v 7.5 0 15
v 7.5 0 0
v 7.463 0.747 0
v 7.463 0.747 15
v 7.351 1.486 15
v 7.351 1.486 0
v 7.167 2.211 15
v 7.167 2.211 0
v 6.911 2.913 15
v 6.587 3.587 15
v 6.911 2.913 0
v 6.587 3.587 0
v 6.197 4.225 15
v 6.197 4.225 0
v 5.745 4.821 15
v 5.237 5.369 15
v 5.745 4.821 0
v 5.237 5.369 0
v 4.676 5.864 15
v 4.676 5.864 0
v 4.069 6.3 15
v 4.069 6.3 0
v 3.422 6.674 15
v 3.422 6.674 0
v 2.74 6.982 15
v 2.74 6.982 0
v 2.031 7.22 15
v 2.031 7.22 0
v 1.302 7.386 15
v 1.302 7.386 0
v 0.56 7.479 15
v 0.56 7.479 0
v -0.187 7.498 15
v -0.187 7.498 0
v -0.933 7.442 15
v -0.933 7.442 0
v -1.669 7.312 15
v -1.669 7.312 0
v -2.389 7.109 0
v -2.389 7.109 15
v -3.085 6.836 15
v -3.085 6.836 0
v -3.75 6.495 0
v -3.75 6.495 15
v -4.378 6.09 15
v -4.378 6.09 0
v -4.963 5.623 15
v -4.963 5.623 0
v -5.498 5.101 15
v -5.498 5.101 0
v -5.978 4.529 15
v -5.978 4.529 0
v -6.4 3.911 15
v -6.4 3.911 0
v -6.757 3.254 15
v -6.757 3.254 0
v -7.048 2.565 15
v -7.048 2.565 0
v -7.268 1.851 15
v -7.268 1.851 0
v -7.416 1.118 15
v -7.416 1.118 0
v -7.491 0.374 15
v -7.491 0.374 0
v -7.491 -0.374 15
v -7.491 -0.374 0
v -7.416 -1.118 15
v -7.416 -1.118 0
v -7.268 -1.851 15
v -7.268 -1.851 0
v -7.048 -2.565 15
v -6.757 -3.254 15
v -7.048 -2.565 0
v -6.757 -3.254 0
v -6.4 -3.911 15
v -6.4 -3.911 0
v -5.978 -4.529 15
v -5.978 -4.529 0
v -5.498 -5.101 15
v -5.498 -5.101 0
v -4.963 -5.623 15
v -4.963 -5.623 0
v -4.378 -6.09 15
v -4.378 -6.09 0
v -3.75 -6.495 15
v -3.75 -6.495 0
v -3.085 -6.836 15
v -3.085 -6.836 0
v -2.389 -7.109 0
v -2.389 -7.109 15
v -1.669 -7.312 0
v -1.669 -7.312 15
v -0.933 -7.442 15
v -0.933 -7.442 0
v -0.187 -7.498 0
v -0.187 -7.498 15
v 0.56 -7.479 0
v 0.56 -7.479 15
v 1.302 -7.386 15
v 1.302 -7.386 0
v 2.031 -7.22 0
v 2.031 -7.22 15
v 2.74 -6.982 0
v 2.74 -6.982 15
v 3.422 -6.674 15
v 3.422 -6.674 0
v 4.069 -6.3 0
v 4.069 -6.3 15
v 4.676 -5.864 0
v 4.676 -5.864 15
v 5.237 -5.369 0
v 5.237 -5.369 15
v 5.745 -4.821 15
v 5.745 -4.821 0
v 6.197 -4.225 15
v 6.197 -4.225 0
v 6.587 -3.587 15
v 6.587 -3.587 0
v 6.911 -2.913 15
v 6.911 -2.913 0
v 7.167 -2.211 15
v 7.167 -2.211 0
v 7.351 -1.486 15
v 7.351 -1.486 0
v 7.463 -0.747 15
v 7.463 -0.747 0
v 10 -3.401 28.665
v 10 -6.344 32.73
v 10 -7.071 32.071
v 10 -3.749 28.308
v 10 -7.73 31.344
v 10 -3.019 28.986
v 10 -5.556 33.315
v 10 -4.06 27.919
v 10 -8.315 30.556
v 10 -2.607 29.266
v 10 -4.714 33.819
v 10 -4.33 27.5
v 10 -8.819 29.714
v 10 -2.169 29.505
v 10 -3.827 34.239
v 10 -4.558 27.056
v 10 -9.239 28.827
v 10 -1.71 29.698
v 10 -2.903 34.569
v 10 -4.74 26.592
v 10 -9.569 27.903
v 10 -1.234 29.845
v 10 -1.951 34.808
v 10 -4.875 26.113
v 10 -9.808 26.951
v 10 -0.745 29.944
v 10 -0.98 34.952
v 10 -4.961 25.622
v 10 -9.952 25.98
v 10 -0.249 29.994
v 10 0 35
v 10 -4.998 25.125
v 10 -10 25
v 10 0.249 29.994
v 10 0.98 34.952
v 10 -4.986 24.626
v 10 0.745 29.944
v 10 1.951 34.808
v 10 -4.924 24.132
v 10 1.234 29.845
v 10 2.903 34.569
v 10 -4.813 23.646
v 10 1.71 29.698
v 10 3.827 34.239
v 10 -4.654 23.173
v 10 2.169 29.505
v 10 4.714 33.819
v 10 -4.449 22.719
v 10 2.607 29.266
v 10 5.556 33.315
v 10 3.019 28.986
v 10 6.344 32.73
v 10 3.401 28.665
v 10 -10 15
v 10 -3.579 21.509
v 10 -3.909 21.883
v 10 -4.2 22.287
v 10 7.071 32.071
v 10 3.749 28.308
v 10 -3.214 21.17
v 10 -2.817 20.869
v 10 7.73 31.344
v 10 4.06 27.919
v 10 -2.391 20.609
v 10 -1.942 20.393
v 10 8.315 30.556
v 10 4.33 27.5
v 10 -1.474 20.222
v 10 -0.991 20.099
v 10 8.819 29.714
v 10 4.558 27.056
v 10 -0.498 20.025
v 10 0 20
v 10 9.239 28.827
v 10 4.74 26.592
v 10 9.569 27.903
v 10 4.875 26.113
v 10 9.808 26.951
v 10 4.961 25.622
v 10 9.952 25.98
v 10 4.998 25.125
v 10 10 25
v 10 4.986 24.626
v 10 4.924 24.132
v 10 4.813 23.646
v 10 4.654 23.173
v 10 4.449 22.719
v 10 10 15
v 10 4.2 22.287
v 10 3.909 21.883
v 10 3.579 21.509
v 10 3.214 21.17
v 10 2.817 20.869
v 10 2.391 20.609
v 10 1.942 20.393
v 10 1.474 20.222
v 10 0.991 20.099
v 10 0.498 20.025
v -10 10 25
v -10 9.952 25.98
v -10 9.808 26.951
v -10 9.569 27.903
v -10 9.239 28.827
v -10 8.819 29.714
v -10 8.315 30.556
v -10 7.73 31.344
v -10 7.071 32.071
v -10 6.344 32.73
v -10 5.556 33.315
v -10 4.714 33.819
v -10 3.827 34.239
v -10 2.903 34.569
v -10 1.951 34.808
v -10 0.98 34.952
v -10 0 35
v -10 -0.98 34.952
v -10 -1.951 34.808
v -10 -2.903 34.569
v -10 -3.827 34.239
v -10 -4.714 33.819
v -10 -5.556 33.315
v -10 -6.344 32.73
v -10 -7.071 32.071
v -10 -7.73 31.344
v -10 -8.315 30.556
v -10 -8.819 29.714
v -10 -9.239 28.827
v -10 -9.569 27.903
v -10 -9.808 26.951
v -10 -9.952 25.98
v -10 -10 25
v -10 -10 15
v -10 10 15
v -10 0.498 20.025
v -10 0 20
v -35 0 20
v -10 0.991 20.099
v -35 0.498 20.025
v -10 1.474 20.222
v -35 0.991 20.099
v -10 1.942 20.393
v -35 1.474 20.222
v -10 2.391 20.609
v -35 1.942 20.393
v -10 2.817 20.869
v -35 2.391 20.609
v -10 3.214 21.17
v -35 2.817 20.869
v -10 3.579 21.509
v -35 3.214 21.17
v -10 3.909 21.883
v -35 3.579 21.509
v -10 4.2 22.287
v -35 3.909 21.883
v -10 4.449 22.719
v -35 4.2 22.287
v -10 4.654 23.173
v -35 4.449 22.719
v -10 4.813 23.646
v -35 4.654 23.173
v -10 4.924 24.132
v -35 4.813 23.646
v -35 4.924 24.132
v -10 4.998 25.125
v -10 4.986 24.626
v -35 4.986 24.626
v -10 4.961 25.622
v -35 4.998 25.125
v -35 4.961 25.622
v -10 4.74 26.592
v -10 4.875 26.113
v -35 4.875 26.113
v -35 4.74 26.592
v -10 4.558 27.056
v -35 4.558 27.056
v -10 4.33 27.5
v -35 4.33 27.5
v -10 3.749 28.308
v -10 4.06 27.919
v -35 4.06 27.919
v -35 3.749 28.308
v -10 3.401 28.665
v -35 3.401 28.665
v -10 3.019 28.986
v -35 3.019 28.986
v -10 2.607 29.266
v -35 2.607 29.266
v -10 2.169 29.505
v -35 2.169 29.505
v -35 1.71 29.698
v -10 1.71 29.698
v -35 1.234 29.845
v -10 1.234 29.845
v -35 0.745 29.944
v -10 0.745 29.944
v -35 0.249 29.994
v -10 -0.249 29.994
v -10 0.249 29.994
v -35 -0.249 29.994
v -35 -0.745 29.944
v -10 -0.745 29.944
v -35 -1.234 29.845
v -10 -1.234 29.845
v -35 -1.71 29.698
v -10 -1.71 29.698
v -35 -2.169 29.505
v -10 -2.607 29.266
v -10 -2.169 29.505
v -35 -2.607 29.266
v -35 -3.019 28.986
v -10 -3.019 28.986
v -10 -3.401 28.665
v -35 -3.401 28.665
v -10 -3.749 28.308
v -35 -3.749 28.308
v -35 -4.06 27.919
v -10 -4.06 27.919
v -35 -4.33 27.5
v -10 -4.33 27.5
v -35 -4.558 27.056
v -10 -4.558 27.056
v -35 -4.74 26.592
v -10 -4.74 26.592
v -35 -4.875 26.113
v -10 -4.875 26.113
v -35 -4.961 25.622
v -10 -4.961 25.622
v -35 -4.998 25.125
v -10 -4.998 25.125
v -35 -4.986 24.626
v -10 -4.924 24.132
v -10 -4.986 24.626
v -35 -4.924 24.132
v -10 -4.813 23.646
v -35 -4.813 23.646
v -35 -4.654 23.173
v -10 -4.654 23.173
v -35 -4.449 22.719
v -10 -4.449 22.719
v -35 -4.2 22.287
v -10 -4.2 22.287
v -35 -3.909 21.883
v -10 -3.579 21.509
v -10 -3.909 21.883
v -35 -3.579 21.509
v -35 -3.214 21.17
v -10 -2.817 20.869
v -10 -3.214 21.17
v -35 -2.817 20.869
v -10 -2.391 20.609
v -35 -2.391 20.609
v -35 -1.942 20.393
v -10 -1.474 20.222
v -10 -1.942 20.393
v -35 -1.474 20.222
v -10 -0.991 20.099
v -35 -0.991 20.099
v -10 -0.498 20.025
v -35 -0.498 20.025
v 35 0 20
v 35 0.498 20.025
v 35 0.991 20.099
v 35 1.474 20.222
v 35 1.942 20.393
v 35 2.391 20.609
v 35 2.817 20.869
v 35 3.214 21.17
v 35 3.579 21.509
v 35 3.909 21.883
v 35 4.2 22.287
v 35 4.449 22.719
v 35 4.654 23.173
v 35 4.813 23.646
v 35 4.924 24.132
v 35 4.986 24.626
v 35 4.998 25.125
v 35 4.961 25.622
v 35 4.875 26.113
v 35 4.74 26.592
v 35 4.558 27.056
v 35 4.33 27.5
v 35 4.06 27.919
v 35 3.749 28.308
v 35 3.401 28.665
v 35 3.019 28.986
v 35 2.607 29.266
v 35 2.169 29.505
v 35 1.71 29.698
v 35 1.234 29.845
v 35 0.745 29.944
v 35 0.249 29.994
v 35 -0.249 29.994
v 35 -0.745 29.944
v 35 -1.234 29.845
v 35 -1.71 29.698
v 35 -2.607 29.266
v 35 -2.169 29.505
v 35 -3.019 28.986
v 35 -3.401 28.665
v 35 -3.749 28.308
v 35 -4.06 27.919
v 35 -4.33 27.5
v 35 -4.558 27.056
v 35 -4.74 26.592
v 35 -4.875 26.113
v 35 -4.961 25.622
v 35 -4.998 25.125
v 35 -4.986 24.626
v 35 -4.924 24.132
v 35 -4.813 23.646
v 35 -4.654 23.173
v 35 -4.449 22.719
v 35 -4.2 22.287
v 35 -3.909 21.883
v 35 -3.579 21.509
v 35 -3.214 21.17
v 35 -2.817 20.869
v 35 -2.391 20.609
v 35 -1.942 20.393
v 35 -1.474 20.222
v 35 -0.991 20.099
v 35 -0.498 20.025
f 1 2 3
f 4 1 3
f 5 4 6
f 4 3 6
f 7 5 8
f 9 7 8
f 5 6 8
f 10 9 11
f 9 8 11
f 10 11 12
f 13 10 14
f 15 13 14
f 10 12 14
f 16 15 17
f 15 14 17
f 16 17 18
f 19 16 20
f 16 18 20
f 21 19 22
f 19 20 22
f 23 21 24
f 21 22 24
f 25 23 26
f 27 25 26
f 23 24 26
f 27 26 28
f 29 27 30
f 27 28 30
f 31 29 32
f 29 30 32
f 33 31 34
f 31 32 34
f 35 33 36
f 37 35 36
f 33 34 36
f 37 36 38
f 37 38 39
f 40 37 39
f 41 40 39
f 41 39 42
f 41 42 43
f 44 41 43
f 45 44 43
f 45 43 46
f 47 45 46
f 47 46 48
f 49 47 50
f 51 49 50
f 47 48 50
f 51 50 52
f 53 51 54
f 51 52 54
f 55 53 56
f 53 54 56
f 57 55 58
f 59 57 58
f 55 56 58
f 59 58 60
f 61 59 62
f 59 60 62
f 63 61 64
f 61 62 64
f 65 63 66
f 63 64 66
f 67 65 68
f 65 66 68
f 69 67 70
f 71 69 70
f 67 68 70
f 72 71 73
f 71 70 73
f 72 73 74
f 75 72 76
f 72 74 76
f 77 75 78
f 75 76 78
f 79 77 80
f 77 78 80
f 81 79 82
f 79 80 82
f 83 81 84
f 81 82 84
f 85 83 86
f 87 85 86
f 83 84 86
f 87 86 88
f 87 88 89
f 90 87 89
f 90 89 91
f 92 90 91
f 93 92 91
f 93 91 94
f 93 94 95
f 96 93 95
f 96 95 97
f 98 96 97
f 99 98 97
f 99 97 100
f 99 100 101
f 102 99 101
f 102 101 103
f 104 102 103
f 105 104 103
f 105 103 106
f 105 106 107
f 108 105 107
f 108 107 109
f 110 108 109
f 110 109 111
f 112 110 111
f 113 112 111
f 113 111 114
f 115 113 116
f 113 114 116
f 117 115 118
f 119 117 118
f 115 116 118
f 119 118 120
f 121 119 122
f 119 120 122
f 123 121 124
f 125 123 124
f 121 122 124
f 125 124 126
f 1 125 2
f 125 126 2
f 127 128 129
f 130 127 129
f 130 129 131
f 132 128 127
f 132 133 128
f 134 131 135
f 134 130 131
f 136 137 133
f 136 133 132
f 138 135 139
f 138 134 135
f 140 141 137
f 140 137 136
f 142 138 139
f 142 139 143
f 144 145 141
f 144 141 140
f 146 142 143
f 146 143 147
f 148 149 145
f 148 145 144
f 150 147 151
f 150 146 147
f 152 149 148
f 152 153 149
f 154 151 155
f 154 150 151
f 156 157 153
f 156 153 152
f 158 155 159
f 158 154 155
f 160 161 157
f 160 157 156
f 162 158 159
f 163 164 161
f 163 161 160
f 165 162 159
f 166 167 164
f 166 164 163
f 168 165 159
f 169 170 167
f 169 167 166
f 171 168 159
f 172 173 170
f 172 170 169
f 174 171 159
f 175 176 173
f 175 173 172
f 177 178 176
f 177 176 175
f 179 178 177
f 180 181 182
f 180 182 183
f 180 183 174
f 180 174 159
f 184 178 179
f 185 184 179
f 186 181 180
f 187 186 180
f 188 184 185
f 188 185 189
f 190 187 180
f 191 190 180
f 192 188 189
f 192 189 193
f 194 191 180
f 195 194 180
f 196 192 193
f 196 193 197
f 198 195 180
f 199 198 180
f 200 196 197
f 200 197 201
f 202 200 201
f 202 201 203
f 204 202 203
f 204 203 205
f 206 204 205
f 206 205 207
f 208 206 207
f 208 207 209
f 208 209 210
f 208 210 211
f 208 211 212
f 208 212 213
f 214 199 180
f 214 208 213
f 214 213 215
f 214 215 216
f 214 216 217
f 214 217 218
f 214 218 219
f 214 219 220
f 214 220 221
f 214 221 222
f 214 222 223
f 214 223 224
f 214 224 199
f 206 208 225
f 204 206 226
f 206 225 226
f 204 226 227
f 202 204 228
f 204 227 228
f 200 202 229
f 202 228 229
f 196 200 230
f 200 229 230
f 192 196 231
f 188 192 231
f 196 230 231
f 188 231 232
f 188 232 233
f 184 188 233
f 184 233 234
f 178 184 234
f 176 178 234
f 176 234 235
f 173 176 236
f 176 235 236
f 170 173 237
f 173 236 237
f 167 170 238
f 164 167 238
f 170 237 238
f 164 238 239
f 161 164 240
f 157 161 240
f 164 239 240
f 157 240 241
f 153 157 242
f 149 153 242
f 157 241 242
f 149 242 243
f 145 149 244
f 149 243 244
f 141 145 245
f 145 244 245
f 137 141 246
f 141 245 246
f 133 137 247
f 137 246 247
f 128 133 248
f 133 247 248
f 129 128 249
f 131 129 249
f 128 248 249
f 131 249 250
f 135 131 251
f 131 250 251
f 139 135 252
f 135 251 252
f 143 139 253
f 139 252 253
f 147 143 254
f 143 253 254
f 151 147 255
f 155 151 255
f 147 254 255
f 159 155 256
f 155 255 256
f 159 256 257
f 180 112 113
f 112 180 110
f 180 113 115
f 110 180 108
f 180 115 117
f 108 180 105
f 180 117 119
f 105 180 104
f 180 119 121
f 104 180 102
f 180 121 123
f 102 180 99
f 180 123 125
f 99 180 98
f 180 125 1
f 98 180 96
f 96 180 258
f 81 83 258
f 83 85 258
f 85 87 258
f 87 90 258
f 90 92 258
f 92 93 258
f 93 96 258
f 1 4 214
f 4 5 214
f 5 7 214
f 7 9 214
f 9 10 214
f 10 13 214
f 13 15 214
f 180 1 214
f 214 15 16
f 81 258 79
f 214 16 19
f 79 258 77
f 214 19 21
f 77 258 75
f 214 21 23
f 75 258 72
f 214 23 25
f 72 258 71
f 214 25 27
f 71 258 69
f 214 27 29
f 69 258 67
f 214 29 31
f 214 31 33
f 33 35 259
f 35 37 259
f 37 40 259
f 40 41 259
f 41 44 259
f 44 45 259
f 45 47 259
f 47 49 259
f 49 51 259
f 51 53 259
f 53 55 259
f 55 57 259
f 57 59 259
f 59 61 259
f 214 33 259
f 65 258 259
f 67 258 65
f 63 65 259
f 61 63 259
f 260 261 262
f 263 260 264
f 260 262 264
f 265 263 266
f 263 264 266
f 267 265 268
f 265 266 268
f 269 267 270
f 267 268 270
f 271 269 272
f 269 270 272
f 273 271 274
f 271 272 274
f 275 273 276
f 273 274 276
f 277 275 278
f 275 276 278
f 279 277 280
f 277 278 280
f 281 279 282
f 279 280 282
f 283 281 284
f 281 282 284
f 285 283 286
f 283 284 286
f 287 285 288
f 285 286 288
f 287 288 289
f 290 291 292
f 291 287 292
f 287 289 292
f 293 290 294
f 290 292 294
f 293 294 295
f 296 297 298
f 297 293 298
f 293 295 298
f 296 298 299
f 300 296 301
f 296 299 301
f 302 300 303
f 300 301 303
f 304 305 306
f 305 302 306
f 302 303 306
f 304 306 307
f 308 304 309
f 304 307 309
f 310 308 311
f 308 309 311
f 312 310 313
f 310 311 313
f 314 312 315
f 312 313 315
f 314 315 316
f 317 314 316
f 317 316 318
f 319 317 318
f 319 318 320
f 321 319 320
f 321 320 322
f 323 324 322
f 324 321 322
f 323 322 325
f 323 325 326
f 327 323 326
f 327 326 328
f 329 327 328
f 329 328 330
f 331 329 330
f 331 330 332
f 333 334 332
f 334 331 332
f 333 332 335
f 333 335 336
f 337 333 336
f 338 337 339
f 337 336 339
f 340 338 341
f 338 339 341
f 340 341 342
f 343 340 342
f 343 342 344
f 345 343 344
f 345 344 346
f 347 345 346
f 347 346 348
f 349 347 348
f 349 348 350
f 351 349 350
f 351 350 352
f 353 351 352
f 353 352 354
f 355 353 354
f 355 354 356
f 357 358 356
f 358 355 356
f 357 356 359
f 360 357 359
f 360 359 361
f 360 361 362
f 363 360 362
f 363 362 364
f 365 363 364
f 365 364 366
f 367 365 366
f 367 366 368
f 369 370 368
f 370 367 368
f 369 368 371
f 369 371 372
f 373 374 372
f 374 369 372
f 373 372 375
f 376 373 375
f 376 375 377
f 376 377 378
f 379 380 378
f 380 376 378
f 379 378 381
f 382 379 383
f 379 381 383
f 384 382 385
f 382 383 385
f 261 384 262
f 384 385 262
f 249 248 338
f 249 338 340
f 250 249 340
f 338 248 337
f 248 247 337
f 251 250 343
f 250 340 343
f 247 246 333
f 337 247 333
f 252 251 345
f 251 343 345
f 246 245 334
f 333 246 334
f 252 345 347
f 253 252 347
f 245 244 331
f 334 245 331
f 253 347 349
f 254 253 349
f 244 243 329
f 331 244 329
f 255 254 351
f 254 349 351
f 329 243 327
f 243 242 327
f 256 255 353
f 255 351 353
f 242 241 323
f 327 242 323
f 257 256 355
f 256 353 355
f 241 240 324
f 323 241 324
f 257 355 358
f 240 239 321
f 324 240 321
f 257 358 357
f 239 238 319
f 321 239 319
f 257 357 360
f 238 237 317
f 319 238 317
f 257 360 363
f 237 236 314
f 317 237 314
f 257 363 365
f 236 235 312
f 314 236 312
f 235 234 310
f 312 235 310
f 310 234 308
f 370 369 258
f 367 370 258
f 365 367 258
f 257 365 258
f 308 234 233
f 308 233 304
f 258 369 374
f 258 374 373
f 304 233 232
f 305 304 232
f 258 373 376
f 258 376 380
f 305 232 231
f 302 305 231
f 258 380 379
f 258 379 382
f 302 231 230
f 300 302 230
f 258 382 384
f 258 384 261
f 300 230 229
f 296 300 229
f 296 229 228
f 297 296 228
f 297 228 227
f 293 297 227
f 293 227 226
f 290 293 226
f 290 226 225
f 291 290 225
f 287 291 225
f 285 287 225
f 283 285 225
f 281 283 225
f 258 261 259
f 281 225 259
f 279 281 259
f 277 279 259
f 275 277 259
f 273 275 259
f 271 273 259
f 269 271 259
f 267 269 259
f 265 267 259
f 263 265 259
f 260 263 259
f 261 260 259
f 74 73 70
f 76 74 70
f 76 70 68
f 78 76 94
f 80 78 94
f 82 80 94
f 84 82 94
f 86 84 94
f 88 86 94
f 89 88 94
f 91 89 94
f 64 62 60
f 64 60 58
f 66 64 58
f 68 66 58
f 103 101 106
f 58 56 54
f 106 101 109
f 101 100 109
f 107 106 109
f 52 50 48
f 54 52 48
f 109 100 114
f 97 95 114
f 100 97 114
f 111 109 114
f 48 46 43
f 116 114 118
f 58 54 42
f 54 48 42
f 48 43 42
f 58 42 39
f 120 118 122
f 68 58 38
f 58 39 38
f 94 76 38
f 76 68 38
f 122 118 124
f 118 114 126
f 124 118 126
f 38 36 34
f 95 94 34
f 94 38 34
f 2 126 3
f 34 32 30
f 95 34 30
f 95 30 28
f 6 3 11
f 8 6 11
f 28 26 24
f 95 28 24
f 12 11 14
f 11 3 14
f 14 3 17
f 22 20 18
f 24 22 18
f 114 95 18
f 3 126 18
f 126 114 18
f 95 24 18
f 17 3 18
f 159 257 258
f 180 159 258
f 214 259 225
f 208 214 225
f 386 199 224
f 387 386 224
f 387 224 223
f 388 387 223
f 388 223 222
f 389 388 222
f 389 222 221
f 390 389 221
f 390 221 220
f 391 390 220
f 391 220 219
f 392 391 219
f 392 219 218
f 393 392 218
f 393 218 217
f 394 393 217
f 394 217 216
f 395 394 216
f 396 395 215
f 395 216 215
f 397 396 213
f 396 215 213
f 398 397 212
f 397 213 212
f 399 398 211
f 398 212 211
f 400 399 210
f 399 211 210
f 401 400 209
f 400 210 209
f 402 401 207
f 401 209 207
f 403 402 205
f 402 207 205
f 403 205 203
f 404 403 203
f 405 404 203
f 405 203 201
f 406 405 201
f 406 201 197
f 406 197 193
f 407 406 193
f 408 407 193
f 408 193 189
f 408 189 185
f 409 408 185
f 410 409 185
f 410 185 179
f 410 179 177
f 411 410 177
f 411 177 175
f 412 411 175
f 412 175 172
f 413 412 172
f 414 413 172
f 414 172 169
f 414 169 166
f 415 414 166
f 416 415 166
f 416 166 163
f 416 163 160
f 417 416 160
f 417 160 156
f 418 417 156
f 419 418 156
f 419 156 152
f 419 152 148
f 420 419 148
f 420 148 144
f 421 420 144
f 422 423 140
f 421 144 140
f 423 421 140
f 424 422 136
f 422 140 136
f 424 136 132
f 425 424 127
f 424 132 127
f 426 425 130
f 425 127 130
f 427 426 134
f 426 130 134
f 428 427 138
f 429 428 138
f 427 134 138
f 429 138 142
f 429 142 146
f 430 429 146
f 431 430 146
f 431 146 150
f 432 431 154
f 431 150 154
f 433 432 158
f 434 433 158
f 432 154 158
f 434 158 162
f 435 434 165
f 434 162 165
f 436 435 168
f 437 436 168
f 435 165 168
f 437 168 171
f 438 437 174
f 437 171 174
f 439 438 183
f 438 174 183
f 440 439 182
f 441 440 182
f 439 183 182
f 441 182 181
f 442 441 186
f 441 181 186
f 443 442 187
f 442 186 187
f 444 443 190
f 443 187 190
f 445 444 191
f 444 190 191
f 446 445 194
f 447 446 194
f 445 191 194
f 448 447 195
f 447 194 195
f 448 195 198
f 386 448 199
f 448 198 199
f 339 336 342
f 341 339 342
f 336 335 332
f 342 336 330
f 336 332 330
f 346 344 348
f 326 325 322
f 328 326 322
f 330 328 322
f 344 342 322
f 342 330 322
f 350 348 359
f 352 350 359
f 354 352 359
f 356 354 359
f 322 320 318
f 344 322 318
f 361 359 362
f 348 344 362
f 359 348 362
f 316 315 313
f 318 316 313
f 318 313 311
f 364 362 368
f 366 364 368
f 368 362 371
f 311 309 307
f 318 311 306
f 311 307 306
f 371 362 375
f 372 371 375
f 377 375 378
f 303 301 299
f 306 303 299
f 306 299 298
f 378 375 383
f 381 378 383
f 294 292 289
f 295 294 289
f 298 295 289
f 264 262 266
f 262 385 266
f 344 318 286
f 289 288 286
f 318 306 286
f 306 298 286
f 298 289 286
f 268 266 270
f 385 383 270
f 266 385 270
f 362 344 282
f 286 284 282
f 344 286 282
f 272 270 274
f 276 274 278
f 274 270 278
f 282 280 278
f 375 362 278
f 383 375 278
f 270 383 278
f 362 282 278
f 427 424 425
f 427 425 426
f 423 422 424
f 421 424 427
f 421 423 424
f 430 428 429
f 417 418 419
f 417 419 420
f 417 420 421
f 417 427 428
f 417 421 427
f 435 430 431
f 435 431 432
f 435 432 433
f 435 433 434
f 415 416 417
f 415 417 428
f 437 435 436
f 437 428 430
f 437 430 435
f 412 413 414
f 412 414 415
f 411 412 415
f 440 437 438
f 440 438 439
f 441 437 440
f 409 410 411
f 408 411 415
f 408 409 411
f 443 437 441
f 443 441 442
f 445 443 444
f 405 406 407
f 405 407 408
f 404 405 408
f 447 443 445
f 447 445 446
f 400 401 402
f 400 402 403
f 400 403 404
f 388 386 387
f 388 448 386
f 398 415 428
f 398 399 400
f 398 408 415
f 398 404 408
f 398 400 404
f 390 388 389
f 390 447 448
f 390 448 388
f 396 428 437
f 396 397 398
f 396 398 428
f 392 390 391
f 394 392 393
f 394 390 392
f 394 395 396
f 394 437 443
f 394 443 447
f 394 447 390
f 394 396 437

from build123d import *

# Parameters (mm, degrees)
SKETCH_1_R           = 7.5
EXTRUDE_1_DEPTH      = 15
EXTRUDE_2_DEPTH      = 10
EXTRUDE_2_DEPTH_BACK = 10
EXTRUDE_3_DEPTH      = 35
EXTRUDE_3_DEPTH_BACK = 35
SKETCH_3_R           = 5


with BuildPart() as part:
    # Эскиз1 → Бобышка-Вытянуть1 (new body)
    with BuildSketch(Plane.XY):
        Circle(SKETCH_1_R)
    extrude(amount=EXTRUDE_1_DEPTH)

    # Эскиз2 → Бобышка-Вытянуть2 (add, two sides: drawn at the far end of the back side and taken through both)
    with BuildSketch(Plane(origin=(0, 0, 0), x_dir=(0, 0, -1), z_dir=(1, 0, 0)).offset(-EXTRUDE_2_DEPTH_BACK)):
        with BuildLine():
            Line((-15, 10), (-25, 10))
            ThreePointArc((-25, 10), (-35, 0), (-25, -10))
            Line((-25, -10), (-15, -10))
            Line((-15, -10), (-15, 10))
        make_face()
    extrude(amount=EXTRUDE_2_DEPTH + EXTRUDE_2_DEPTH_BACK)

    # Эскиз3 → Бобышка-Вытянуть3 (add, two sides: drawn at the far end of the back side and taken through both)
    with BuildSketch(Plane(origin=(0, 0, 0), x_dir=(0, 0, -1), z_dir=(1, 0, 0)).offset(-EXTRUDE_3_DEPTH_BACK)):
        with Locations((-25, 0)):
            Circle(SKETCH_3_R)
    extrude(amount=EXTRUDE_3_DEPTH + EXTRUDE_3_DEPTH_BACK)


solid = part.part
